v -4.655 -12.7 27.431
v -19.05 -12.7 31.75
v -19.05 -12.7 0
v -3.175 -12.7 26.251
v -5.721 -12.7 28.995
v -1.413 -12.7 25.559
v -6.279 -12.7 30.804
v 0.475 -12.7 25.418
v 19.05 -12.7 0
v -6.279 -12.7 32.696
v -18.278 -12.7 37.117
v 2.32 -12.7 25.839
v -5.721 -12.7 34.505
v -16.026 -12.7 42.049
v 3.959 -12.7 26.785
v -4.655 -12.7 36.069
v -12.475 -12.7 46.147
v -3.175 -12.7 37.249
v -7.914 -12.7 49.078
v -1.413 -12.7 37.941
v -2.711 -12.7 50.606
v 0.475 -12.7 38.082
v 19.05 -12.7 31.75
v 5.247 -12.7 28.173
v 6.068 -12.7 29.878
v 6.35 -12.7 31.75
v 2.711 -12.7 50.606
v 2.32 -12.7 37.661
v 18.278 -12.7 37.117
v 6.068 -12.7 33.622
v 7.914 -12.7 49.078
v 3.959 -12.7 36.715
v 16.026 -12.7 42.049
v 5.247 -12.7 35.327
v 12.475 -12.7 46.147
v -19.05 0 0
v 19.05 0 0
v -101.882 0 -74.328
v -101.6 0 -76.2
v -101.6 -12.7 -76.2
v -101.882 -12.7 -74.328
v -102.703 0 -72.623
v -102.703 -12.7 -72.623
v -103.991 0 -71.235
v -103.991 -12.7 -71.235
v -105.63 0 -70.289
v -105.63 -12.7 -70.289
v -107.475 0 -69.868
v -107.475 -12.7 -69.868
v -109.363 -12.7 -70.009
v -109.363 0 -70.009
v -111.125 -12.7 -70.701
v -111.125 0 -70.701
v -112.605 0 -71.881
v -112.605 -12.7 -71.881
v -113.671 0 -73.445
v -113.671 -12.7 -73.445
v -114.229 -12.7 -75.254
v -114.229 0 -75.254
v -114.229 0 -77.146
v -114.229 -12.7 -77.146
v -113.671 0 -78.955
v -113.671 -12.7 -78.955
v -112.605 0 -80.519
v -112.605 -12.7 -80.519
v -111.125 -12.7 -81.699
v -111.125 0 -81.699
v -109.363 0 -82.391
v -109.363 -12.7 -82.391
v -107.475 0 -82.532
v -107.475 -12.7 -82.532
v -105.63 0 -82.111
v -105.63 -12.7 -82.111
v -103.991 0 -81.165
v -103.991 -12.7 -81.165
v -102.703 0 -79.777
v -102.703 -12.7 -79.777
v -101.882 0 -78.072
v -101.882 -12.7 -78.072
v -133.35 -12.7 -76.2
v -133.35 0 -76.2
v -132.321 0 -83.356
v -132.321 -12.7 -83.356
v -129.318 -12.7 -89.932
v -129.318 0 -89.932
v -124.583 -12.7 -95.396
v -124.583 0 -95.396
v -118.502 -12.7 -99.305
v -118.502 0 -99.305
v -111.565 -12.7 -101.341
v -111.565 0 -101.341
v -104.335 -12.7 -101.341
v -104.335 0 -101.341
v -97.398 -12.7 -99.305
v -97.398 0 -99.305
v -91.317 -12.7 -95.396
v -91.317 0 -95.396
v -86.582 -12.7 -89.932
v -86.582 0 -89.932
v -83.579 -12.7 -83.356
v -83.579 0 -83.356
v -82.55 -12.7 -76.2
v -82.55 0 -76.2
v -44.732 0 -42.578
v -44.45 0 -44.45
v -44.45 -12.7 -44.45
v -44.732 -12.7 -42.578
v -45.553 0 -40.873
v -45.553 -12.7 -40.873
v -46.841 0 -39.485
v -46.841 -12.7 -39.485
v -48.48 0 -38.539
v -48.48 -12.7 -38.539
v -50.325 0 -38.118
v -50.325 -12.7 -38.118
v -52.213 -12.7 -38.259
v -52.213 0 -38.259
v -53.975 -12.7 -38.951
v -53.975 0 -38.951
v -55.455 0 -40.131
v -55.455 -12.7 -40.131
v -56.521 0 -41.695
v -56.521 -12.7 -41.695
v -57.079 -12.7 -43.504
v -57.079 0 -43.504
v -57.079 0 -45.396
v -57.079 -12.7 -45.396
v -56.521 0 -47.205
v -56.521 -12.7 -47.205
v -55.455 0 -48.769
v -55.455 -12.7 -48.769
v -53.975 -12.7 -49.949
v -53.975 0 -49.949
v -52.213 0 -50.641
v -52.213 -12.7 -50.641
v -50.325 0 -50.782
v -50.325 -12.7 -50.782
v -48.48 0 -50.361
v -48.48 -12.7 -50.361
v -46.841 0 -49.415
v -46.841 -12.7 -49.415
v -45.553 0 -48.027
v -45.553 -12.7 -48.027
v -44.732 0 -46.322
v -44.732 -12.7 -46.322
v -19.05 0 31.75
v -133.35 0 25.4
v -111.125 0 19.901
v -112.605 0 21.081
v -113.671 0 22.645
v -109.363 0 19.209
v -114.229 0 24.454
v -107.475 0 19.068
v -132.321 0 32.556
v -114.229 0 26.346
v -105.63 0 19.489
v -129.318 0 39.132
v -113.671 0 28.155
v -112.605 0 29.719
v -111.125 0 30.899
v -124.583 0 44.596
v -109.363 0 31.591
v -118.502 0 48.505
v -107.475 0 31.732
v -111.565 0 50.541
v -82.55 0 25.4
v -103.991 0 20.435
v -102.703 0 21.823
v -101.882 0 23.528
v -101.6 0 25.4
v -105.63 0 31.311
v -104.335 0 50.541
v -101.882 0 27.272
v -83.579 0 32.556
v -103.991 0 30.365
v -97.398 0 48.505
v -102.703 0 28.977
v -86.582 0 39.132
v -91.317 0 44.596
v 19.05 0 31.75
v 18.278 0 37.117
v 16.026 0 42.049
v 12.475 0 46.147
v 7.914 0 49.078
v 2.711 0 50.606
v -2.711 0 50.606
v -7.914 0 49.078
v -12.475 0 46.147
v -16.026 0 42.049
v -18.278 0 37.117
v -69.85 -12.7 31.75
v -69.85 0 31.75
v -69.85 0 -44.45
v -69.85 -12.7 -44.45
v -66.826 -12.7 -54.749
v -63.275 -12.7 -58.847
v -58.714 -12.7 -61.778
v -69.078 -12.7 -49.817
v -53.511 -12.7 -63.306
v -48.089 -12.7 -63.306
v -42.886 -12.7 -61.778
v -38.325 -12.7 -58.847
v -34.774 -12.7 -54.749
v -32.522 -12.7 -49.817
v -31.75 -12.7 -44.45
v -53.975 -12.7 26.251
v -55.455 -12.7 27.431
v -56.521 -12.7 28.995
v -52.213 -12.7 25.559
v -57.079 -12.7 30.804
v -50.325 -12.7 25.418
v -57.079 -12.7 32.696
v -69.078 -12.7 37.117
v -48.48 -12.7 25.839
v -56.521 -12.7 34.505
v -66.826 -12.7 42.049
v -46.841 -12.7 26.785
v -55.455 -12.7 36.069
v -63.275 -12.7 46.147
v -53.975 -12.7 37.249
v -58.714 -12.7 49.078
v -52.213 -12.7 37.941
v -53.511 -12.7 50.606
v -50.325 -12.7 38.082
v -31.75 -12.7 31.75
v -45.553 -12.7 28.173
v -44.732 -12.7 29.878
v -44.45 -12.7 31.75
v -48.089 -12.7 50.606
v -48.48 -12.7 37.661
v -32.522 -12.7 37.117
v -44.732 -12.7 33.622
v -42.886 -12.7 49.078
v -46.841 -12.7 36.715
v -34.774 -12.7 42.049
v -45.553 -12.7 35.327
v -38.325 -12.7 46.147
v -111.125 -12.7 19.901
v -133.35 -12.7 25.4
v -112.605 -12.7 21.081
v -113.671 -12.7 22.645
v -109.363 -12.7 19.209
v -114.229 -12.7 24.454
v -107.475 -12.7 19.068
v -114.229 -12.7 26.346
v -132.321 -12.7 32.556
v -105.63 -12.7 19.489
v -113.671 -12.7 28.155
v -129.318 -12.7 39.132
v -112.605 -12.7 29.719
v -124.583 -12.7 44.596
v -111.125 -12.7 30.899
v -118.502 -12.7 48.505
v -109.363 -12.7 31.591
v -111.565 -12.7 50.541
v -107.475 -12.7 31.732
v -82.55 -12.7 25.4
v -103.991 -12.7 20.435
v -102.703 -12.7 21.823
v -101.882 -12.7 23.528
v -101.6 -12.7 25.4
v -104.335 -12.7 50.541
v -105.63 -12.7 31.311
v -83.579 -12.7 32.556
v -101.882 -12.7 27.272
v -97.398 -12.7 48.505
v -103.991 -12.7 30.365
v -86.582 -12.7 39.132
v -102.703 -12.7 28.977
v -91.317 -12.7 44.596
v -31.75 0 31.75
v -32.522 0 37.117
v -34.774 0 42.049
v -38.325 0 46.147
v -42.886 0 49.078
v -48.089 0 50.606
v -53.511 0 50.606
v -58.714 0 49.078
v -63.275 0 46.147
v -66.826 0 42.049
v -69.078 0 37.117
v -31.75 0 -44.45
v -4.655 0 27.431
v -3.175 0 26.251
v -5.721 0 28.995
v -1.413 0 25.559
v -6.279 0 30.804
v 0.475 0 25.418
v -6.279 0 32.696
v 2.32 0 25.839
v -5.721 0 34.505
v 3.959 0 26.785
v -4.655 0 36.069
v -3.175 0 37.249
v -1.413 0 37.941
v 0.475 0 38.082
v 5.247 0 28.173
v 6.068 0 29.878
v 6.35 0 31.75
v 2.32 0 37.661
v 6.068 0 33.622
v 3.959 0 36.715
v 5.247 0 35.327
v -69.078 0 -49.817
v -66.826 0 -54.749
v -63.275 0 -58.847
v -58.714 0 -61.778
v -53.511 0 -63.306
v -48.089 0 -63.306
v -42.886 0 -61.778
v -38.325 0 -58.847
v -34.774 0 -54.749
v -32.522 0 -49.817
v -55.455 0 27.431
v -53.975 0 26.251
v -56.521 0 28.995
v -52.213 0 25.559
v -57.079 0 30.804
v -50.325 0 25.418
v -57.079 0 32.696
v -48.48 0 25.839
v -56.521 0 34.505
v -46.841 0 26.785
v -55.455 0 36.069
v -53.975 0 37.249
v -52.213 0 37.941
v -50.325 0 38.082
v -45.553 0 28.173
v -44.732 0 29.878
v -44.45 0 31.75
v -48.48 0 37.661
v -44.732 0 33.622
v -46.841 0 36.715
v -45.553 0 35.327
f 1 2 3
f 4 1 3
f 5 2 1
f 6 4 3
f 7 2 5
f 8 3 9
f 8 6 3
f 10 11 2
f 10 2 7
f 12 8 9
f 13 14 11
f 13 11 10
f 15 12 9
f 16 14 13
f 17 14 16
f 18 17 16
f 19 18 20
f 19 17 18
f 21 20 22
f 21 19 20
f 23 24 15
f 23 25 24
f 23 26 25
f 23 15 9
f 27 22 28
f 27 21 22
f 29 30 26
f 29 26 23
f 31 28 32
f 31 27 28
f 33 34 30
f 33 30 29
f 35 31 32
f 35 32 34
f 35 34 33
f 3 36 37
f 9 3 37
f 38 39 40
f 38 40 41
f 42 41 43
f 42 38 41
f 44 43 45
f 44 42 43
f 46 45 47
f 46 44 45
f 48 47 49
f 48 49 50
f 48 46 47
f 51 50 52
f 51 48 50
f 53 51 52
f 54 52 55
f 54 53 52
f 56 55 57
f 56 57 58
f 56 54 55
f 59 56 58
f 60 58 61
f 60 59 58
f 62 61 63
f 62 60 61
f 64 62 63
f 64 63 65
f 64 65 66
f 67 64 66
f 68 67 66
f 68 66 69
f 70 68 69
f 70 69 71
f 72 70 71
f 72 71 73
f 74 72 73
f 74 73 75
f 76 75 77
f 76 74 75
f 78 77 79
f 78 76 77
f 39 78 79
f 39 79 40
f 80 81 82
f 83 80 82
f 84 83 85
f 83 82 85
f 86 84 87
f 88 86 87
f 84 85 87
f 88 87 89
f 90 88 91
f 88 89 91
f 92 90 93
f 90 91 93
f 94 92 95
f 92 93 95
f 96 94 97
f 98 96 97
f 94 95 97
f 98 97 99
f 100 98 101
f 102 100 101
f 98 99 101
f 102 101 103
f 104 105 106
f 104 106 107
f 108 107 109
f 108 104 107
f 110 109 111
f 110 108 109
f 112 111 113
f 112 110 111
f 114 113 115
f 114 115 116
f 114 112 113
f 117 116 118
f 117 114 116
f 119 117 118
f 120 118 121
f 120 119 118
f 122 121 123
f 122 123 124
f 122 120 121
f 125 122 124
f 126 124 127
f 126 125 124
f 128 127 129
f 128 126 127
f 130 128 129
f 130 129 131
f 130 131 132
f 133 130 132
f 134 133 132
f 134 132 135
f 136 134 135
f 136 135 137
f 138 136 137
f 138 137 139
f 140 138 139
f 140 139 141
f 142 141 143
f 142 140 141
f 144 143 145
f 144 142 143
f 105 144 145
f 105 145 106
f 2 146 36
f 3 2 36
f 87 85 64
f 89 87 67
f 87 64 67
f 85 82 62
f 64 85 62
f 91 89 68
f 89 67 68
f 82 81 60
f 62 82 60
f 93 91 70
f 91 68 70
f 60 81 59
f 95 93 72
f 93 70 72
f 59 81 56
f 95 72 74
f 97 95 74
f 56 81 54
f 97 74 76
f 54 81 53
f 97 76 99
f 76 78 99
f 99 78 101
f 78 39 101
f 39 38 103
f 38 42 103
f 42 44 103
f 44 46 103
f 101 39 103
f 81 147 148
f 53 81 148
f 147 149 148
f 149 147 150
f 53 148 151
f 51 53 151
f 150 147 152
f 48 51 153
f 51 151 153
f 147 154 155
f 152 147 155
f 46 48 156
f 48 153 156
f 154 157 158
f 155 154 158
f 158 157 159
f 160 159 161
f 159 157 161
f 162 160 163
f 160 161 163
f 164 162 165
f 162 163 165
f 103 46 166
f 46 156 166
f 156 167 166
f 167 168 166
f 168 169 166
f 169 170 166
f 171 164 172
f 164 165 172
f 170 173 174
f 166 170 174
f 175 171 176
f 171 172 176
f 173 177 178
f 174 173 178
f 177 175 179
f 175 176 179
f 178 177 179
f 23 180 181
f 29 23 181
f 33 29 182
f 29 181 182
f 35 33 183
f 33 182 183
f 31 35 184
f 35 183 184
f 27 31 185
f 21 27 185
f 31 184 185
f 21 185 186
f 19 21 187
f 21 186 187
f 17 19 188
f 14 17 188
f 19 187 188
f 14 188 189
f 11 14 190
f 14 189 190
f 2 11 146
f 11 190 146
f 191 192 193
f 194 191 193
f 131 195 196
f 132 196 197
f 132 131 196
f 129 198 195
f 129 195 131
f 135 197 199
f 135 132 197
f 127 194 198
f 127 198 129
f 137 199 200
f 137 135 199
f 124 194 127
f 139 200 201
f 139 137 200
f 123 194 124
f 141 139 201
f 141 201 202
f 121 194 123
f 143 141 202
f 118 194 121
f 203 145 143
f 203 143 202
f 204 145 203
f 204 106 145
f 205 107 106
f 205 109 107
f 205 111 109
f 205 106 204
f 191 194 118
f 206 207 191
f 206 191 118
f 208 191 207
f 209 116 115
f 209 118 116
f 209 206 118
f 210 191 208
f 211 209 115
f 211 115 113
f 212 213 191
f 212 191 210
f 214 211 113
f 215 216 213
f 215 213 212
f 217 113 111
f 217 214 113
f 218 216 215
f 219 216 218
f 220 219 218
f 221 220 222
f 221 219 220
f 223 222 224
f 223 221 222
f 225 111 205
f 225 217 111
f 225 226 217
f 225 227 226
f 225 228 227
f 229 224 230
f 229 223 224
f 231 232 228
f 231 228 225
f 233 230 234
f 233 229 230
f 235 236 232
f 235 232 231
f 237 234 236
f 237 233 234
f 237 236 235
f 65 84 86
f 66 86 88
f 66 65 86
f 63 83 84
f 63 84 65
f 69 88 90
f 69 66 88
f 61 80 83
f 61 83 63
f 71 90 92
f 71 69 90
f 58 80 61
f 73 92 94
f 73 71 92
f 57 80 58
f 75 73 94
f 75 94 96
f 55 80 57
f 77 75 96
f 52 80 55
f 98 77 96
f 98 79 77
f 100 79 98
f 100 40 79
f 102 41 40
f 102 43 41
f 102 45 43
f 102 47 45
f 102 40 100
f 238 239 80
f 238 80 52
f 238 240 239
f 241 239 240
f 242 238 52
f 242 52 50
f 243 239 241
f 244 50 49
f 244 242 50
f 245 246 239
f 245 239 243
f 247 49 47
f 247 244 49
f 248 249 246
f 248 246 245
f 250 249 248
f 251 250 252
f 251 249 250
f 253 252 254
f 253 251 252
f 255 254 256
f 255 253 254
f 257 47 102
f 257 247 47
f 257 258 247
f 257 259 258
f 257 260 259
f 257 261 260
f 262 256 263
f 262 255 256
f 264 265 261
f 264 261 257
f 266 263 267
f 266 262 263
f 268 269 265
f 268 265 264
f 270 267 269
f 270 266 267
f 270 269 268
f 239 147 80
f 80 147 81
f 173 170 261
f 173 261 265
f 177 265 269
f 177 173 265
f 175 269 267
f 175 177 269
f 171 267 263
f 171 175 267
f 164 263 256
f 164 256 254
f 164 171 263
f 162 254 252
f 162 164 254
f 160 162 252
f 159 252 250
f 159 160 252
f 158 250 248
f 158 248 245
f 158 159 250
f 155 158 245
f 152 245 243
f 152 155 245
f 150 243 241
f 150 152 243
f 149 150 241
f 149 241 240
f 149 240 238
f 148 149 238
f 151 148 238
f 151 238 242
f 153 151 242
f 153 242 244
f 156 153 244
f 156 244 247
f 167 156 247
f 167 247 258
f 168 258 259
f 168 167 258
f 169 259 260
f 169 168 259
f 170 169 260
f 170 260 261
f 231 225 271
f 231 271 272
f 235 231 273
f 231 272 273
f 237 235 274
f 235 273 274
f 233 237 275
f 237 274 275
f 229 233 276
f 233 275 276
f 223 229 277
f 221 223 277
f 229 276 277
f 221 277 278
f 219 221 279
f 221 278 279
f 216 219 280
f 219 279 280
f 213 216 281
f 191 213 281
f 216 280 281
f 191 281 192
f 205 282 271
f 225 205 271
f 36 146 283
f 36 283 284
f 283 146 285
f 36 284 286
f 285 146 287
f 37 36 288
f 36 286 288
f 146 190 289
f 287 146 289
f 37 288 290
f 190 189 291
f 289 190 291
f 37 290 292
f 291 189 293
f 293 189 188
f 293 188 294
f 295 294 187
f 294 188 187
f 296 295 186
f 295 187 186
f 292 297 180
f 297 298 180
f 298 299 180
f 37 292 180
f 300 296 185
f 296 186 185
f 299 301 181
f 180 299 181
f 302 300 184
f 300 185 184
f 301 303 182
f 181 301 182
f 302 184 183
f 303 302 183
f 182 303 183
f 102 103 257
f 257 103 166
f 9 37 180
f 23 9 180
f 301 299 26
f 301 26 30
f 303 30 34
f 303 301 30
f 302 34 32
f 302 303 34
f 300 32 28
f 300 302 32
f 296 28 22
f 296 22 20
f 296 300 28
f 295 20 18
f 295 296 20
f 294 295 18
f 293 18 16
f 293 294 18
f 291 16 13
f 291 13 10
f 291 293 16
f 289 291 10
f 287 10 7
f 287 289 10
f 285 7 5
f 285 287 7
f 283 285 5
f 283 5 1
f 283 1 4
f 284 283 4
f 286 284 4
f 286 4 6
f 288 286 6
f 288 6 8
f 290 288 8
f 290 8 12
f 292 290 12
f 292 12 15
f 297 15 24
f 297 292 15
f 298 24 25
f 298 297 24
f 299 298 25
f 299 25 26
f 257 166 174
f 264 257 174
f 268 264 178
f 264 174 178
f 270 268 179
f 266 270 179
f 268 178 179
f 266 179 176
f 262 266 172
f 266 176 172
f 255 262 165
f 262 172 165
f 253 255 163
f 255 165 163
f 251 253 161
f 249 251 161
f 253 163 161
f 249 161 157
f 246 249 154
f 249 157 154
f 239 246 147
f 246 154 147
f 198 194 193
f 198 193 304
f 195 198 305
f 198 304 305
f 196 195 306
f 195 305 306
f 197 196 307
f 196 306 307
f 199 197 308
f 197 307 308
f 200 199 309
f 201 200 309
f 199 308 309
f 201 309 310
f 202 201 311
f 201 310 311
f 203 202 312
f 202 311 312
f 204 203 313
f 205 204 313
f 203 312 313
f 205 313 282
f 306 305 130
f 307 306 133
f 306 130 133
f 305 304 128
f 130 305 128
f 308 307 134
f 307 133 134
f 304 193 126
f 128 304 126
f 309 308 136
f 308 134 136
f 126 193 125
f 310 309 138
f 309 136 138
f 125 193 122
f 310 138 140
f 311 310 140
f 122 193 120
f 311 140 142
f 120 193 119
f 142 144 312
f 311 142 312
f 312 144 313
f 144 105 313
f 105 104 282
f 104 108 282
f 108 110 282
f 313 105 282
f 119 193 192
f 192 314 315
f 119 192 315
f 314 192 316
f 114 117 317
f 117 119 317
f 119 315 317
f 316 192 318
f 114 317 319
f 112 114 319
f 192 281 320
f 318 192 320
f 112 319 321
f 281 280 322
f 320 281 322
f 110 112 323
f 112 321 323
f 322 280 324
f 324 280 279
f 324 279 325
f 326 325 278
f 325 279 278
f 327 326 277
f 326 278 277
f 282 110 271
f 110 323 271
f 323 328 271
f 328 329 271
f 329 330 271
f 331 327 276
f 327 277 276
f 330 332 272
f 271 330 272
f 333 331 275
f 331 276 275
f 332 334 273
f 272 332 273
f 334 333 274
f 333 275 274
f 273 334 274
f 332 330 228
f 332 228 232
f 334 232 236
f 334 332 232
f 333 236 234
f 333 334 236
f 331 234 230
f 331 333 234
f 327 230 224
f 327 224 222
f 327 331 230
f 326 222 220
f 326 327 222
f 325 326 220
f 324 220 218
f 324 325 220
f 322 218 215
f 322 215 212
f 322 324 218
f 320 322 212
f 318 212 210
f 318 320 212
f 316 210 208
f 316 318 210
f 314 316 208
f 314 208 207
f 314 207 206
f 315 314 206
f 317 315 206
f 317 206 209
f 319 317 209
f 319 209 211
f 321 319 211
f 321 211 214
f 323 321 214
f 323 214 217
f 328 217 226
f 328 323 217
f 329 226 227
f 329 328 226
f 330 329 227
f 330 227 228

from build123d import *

# Parameters (mm, degrees)
F0_R     = 6.35
F1_DEPTH = 12.7
F2_R     = 6.35
F3_DEPTH = 12.7
F4_R     = 6.35
F5_DEPTH = 12.7


with BuildPart() as f1:
    # F0 (on Front) → F1 (new body)
    with BuildSketch(Plane.XZ):
        with BuildLine():
            Line((19.05, 0), (19.05, 31.75))
            ThreePointArc((19.05, 31.75), (0, 50.8), (-19.05, 31.75))
            Line((-19.05, 31.75), (-19.05, 0))
            Line((-19.05, 0), (19.05, 0))
        make_face()
        with Locations((0, 31.75)):
            Circle(F0_R, mode=Mode.SUBTRACT)
    extrude(amount=F1_DEPTH)


with BuildPart() as f3:
    # F2 (on Front) → F3 (new body)
    with BuildSketch(Plane.XZ):
        with BuildLine():
            Line((-31.75, -44.45), (-31.75, 31.75))
            ThreePointArc((-31.75, 31.75), (-50.8, 50.8), (-69.85, 31.75))
            Line((-69.85, 31.75), (-69.85, -44.45))
            ThreePointArc((-69.85, -44.45), (-50.8, -63.5), (-31.75, -44.45))
        make_face()
        with Locations((-50.8, -44.45)):
            Circle(F2_R, mode=Mode.SUBTRACT)
        with Locations((-50.8, 31.75)):
            Circle(F2_R, mode=Mode.SUBTRACT)
    extrude(amount=F3_DEPTH)


with BuildPart() as f5:
    # F4 (on Front) → F5 (new body)
    with BuildSketch(Plane.XZ):
        with BuildLine():
            Line((-82.55, -76.2), (-82.55, 25.4))
            ThreePointArc((-82.55, 25.4), (-107.95, 50.8), (-133.35, 25.4))
            Line((-133.35, 25.4), (-133.35, -76.2))
            ThreePointArc((-133.35, -76.2), (-107.95, -101.6), (-82.55, -76.2))
        make_face()
        with Locations((-107.95, -76.2)):
            Circle(F4_R, mode=Mode.SUBTRACT)
        with Locations((-107.95, 25.4)):
            Circle(F4_R, mode=Mode.SUBTRACT)
    extrude(amount=F5_DEPTH)


solid = Compound([f1.part, f3.part, f5.part])
